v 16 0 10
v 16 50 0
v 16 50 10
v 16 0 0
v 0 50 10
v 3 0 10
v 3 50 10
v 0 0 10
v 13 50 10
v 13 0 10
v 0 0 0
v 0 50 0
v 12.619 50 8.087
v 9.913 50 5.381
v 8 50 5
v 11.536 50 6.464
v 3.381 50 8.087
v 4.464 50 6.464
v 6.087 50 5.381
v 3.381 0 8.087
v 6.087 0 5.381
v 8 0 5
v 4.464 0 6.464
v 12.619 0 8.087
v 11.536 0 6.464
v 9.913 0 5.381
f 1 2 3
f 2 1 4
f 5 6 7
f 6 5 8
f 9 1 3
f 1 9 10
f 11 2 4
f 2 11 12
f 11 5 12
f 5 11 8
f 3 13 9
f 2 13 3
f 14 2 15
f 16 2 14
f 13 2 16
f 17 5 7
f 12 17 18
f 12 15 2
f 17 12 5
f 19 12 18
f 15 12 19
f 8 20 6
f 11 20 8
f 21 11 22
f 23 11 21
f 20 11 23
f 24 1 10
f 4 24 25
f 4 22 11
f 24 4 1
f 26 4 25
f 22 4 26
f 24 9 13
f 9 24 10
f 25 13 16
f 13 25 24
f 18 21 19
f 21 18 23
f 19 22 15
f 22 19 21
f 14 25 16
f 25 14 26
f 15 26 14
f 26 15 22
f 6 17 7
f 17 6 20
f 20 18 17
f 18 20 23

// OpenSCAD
difference() {
  cube([16, 50, 10]);
  rotate([-90, 0, 0]) translate([8, -10, -1]) cylinder(52, 5, 5);
}
